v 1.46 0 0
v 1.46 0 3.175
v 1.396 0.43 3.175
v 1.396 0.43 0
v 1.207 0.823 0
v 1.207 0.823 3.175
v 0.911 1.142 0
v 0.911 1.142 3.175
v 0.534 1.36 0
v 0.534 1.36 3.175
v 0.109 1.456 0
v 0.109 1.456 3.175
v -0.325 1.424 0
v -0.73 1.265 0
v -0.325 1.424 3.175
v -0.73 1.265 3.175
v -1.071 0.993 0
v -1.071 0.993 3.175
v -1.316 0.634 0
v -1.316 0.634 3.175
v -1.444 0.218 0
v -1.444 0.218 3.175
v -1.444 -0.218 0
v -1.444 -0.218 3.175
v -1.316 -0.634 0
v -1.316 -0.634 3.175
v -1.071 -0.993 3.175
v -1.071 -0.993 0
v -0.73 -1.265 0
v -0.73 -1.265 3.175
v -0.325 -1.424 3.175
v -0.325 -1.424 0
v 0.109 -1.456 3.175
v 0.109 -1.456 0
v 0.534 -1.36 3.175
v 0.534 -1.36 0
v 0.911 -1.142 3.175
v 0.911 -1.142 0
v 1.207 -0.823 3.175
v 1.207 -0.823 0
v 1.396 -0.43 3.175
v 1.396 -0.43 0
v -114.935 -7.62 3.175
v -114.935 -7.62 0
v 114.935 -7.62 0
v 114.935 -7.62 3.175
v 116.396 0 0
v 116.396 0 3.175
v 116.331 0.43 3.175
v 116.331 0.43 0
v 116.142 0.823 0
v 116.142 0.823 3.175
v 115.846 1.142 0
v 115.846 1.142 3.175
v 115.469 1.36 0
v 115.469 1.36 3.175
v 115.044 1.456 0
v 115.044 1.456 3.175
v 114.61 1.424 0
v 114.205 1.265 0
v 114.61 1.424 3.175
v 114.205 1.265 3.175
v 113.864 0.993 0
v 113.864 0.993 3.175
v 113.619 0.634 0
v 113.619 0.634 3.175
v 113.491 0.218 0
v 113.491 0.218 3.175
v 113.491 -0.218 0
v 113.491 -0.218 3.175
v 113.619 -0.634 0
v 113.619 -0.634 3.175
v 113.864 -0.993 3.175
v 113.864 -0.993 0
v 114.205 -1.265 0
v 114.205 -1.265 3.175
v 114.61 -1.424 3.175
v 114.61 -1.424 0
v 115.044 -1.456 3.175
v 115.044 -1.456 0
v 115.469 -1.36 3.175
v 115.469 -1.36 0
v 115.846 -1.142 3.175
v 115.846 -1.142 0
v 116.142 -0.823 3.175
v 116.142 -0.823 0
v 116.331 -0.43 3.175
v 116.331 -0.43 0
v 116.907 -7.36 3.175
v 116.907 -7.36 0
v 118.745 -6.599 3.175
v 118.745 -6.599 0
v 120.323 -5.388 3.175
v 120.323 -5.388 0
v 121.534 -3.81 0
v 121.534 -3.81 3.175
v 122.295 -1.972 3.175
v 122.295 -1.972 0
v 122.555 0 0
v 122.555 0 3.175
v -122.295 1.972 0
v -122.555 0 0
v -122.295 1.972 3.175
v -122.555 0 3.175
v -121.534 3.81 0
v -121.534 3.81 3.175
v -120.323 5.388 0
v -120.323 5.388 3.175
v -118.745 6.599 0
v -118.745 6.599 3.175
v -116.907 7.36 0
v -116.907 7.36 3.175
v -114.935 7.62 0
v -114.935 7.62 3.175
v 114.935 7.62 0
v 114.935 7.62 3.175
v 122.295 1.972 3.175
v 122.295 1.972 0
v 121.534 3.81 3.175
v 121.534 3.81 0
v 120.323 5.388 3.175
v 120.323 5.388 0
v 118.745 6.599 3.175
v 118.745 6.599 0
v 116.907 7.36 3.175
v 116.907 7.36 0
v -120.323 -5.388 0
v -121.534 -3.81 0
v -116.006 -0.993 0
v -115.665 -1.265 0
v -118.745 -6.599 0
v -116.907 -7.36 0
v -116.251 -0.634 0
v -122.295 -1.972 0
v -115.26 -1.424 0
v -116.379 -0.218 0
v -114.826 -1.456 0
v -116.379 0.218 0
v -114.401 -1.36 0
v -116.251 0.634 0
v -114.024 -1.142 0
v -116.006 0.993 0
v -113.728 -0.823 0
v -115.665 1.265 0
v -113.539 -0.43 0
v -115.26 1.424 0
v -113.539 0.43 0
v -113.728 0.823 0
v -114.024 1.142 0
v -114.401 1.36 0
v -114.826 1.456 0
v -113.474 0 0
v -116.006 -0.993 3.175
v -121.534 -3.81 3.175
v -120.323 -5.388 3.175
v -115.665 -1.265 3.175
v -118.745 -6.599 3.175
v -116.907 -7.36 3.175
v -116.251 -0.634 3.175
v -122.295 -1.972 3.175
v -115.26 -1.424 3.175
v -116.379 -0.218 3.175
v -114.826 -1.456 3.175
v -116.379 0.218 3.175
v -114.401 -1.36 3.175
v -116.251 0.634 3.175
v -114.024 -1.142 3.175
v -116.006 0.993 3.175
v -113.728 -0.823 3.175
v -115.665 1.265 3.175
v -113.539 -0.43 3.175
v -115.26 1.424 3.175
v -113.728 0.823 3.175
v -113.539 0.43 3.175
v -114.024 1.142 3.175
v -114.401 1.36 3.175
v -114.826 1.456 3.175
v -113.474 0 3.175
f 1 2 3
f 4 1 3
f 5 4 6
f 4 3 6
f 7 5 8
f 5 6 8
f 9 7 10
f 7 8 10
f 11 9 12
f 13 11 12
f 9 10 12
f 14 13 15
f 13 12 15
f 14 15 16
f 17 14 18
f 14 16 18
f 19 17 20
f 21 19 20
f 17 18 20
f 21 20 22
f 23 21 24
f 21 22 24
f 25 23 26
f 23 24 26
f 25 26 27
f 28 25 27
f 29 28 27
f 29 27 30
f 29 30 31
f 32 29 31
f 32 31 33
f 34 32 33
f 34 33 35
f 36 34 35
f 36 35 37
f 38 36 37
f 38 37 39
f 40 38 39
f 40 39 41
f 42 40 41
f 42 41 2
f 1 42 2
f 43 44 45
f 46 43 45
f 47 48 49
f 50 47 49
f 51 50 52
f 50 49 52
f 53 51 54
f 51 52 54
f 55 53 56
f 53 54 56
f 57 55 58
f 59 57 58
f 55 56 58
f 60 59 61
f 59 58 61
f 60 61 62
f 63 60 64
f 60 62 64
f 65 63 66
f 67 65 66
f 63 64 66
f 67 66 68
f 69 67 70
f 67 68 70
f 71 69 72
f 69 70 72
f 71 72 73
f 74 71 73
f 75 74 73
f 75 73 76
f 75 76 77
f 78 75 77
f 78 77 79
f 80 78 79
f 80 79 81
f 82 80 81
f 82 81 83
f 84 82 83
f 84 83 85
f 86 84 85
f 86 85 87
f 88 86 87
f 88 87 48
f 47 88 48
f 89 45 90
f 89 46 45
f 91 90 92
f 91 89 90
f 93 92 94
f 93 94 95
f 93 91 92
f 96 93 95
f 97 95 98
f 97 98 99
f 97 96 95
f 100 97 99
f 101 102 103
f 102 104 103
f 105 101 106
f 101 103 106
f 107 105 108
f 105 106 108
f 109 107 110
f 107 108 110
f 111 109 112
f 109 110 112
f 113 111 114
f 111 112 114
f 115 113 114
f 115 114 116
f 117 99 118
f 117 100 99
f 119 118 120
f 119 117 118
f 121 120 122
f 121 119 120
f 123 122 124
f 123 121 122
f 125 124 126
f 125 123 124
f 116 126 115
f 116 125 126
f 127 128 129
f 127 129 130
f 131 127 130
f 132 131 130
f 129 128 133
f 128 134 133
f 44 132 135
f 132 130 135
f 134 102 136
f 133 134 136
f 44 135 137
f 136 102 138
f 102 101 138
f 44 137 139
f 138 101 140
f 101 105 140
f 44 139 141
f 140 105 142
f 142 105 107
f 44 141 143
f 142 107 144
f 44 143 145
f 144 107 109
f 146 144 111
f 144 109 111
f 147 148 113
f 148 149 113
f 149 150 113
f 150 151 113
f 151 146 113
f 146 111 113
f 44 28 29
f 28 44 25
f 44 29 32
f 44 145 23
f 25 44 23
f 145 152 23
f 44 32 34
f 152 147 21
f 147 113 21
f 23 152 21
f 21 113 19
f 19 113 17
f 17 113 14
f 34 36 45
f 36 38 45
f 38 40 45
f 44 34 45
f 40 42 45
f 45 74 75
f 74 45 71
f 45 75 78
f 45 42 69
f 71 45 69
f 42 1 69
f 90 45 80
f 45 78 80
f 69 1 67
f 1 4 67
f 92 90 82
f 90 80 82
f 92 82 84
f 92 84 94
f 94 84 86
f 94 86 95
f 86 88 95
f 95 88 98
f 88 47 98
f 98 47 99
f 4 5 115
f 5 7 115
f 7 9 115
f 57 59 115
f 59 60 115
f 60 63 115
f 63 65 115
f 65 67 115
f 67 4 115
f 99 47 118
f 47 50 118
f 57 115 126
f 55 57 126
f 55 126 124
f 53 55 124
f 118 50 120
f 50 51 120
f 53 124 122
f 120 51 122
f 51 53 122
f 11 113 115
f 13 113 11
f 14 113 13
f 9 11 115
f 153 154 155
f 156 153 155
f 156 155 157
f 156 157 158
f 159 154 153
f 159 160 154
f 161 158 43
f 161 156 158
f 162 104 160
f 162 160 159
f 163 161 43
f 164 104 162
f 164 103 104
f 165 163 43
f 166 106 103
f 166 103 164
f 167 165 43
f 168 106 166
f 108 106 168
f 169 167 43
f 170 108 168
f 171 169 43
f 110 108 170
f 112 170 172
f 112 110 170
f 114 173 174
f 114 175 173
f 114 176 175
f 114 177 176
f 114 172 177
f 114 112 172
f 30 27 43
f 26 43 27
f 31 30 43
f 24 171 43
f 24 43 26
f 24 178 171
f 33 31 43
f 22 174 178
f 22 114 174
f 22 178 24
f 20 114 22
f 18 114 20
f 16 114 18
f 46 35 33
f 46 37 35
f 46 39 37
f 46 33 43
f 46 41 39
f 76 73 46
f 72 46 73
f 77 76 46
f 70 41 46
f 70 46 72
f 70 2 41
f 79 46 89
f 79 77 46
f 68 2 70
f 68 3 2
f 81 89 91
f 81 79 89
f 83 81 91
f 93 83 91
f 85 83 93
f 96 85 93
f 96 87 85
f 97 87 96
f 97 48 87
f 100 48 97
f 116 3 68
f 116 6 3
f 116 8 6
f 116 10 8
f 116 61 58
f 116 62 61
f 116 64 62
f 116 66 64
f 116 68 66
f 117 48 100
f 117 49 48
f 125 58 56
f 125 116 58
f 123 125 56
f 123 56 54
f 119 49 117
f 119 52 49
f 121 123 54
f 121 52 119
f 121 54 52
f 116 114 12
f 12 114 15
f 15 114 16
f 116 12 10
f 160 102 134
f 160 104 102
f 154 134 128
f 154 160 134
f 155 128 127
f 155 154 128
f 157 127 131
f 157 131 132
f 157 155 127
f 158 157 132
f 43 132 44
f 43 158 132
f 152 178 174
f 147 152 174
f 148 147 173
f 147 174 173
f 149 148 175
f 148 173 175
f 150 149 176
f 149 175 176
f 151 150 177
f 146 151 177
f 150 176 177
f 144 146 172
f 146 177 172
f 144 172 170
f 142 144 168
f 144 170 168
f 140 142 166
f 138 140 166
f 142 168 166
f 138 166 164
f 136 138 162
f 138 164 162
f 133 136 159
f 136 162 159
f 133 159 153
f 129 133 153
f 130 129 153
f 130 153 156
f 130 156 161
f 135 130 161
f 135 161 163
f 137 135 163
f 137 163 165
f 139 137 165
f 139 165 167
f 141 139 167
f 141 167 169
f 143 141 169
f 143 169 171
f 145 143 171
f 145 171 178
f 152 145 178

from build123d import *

# Parameters (mm, degrees)
SKETCH1_W           = 245.11
SKETCH1_H           = 15.24
BOSS_EXTRUDE1_DEPTH = 3.175
FILLET2_R           = 7.62
SKETCH3_R           = 1.4605
CUT_EXTRUDE1_DEPTH  = 123.832703504


with BuildPart() as part:
    # Sketch1 → Boss-Extrude1 (new body)
    with BuildSketch(Plane.XY):
        Rectangle(SKETCH1_W, SKETCH1_H)
    extrude(amount=BOSS_EXTRUDE1_DEPTH)

    # Fillet2
    fillet2_edges = [part.edges().sort_by_distance(p)[0] for p in [
        (-122.555, -7.62, 1.5875),
        (-122.555, 7.62, 1.5875),
        (122.555, -7.62, 1.5875),
        (122.555, 7.62, 1.5875),
    ]]
    fillet(fillet2_edges, radius=FILLET2_R - 0.0001)  # a hair under: the kernel refuses the full size

    # Sketch3 → Cut-Extrude1 (cut, through all)
    with BuildSketch(Plane.XY.offset(3.175)):
        with Locations((-114.935, 0)):
            Circle(SKETCH3_R)
        with Locations((114.935, 0)):
            Circle(SKETCH3_R)
        Circle(SKETCH3_R)
    extrude(amount=-CUT_EXTRUDE1_DEPTH, mode=Mode.SUBTRACT)


solid = part.part
